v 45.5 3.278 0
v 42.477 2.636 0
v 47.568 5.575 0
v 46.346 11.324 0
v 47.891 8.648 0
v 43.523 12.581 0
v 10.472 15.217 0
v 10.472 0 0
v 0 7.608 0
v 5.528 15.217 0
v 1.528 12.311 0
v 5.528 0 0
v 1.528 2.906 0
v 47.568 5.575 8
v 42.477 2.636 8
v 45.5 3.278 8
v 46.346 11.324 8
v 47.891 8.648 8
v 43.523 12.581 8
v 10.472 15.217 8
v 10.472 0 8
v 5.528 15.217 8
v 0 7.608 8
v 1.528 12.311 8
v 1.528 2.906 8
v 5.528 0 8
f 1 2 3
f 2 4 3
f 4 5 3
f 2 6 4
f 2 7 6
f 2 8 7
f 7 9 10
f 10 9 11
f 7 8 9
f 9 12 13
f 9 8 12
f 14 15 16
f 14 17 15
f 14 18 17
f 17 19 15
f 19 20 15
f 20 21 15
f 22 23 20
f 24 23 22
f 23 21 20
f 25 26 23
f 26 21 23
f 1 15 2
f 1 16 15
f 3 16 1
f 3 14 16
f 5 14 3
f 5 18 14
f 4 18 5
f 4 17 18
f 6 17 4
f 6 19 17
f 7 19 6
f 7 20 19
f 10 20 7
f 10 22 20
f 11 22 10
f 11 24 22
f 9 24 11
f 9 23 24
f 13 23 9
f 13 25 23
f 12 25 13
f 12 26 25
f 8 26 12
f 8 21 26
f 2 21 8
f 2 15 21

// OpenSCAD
$fn = 32;

// ----------------------------------------------------------------------
// Lever arm: two bosses 16 and 10 mm, 35 mm between centres
// ----------------------------------------------------------------------

// --- parameters (mm) ---
profile_height = 8;       // extrusion height
profile_points = 13;      // points of the closed outline

profile = [[0, 7.608], [1.528, 2.906], [5.528, 0], [10.472, 0], [42.477, 2.636], [45.5, 3.278], [47.568, 5.575], [47.891, 8.648], [46.346, 11.324], [43.523, 12.581], [10.472, 15.217], [5.528, 15.217], [1.528, 12.311]];  // single closed polygon, 13 points, counter clockwise

// --- the one profile operation ---
linear_extrude(height = profile_height) polygon(points = profile);
